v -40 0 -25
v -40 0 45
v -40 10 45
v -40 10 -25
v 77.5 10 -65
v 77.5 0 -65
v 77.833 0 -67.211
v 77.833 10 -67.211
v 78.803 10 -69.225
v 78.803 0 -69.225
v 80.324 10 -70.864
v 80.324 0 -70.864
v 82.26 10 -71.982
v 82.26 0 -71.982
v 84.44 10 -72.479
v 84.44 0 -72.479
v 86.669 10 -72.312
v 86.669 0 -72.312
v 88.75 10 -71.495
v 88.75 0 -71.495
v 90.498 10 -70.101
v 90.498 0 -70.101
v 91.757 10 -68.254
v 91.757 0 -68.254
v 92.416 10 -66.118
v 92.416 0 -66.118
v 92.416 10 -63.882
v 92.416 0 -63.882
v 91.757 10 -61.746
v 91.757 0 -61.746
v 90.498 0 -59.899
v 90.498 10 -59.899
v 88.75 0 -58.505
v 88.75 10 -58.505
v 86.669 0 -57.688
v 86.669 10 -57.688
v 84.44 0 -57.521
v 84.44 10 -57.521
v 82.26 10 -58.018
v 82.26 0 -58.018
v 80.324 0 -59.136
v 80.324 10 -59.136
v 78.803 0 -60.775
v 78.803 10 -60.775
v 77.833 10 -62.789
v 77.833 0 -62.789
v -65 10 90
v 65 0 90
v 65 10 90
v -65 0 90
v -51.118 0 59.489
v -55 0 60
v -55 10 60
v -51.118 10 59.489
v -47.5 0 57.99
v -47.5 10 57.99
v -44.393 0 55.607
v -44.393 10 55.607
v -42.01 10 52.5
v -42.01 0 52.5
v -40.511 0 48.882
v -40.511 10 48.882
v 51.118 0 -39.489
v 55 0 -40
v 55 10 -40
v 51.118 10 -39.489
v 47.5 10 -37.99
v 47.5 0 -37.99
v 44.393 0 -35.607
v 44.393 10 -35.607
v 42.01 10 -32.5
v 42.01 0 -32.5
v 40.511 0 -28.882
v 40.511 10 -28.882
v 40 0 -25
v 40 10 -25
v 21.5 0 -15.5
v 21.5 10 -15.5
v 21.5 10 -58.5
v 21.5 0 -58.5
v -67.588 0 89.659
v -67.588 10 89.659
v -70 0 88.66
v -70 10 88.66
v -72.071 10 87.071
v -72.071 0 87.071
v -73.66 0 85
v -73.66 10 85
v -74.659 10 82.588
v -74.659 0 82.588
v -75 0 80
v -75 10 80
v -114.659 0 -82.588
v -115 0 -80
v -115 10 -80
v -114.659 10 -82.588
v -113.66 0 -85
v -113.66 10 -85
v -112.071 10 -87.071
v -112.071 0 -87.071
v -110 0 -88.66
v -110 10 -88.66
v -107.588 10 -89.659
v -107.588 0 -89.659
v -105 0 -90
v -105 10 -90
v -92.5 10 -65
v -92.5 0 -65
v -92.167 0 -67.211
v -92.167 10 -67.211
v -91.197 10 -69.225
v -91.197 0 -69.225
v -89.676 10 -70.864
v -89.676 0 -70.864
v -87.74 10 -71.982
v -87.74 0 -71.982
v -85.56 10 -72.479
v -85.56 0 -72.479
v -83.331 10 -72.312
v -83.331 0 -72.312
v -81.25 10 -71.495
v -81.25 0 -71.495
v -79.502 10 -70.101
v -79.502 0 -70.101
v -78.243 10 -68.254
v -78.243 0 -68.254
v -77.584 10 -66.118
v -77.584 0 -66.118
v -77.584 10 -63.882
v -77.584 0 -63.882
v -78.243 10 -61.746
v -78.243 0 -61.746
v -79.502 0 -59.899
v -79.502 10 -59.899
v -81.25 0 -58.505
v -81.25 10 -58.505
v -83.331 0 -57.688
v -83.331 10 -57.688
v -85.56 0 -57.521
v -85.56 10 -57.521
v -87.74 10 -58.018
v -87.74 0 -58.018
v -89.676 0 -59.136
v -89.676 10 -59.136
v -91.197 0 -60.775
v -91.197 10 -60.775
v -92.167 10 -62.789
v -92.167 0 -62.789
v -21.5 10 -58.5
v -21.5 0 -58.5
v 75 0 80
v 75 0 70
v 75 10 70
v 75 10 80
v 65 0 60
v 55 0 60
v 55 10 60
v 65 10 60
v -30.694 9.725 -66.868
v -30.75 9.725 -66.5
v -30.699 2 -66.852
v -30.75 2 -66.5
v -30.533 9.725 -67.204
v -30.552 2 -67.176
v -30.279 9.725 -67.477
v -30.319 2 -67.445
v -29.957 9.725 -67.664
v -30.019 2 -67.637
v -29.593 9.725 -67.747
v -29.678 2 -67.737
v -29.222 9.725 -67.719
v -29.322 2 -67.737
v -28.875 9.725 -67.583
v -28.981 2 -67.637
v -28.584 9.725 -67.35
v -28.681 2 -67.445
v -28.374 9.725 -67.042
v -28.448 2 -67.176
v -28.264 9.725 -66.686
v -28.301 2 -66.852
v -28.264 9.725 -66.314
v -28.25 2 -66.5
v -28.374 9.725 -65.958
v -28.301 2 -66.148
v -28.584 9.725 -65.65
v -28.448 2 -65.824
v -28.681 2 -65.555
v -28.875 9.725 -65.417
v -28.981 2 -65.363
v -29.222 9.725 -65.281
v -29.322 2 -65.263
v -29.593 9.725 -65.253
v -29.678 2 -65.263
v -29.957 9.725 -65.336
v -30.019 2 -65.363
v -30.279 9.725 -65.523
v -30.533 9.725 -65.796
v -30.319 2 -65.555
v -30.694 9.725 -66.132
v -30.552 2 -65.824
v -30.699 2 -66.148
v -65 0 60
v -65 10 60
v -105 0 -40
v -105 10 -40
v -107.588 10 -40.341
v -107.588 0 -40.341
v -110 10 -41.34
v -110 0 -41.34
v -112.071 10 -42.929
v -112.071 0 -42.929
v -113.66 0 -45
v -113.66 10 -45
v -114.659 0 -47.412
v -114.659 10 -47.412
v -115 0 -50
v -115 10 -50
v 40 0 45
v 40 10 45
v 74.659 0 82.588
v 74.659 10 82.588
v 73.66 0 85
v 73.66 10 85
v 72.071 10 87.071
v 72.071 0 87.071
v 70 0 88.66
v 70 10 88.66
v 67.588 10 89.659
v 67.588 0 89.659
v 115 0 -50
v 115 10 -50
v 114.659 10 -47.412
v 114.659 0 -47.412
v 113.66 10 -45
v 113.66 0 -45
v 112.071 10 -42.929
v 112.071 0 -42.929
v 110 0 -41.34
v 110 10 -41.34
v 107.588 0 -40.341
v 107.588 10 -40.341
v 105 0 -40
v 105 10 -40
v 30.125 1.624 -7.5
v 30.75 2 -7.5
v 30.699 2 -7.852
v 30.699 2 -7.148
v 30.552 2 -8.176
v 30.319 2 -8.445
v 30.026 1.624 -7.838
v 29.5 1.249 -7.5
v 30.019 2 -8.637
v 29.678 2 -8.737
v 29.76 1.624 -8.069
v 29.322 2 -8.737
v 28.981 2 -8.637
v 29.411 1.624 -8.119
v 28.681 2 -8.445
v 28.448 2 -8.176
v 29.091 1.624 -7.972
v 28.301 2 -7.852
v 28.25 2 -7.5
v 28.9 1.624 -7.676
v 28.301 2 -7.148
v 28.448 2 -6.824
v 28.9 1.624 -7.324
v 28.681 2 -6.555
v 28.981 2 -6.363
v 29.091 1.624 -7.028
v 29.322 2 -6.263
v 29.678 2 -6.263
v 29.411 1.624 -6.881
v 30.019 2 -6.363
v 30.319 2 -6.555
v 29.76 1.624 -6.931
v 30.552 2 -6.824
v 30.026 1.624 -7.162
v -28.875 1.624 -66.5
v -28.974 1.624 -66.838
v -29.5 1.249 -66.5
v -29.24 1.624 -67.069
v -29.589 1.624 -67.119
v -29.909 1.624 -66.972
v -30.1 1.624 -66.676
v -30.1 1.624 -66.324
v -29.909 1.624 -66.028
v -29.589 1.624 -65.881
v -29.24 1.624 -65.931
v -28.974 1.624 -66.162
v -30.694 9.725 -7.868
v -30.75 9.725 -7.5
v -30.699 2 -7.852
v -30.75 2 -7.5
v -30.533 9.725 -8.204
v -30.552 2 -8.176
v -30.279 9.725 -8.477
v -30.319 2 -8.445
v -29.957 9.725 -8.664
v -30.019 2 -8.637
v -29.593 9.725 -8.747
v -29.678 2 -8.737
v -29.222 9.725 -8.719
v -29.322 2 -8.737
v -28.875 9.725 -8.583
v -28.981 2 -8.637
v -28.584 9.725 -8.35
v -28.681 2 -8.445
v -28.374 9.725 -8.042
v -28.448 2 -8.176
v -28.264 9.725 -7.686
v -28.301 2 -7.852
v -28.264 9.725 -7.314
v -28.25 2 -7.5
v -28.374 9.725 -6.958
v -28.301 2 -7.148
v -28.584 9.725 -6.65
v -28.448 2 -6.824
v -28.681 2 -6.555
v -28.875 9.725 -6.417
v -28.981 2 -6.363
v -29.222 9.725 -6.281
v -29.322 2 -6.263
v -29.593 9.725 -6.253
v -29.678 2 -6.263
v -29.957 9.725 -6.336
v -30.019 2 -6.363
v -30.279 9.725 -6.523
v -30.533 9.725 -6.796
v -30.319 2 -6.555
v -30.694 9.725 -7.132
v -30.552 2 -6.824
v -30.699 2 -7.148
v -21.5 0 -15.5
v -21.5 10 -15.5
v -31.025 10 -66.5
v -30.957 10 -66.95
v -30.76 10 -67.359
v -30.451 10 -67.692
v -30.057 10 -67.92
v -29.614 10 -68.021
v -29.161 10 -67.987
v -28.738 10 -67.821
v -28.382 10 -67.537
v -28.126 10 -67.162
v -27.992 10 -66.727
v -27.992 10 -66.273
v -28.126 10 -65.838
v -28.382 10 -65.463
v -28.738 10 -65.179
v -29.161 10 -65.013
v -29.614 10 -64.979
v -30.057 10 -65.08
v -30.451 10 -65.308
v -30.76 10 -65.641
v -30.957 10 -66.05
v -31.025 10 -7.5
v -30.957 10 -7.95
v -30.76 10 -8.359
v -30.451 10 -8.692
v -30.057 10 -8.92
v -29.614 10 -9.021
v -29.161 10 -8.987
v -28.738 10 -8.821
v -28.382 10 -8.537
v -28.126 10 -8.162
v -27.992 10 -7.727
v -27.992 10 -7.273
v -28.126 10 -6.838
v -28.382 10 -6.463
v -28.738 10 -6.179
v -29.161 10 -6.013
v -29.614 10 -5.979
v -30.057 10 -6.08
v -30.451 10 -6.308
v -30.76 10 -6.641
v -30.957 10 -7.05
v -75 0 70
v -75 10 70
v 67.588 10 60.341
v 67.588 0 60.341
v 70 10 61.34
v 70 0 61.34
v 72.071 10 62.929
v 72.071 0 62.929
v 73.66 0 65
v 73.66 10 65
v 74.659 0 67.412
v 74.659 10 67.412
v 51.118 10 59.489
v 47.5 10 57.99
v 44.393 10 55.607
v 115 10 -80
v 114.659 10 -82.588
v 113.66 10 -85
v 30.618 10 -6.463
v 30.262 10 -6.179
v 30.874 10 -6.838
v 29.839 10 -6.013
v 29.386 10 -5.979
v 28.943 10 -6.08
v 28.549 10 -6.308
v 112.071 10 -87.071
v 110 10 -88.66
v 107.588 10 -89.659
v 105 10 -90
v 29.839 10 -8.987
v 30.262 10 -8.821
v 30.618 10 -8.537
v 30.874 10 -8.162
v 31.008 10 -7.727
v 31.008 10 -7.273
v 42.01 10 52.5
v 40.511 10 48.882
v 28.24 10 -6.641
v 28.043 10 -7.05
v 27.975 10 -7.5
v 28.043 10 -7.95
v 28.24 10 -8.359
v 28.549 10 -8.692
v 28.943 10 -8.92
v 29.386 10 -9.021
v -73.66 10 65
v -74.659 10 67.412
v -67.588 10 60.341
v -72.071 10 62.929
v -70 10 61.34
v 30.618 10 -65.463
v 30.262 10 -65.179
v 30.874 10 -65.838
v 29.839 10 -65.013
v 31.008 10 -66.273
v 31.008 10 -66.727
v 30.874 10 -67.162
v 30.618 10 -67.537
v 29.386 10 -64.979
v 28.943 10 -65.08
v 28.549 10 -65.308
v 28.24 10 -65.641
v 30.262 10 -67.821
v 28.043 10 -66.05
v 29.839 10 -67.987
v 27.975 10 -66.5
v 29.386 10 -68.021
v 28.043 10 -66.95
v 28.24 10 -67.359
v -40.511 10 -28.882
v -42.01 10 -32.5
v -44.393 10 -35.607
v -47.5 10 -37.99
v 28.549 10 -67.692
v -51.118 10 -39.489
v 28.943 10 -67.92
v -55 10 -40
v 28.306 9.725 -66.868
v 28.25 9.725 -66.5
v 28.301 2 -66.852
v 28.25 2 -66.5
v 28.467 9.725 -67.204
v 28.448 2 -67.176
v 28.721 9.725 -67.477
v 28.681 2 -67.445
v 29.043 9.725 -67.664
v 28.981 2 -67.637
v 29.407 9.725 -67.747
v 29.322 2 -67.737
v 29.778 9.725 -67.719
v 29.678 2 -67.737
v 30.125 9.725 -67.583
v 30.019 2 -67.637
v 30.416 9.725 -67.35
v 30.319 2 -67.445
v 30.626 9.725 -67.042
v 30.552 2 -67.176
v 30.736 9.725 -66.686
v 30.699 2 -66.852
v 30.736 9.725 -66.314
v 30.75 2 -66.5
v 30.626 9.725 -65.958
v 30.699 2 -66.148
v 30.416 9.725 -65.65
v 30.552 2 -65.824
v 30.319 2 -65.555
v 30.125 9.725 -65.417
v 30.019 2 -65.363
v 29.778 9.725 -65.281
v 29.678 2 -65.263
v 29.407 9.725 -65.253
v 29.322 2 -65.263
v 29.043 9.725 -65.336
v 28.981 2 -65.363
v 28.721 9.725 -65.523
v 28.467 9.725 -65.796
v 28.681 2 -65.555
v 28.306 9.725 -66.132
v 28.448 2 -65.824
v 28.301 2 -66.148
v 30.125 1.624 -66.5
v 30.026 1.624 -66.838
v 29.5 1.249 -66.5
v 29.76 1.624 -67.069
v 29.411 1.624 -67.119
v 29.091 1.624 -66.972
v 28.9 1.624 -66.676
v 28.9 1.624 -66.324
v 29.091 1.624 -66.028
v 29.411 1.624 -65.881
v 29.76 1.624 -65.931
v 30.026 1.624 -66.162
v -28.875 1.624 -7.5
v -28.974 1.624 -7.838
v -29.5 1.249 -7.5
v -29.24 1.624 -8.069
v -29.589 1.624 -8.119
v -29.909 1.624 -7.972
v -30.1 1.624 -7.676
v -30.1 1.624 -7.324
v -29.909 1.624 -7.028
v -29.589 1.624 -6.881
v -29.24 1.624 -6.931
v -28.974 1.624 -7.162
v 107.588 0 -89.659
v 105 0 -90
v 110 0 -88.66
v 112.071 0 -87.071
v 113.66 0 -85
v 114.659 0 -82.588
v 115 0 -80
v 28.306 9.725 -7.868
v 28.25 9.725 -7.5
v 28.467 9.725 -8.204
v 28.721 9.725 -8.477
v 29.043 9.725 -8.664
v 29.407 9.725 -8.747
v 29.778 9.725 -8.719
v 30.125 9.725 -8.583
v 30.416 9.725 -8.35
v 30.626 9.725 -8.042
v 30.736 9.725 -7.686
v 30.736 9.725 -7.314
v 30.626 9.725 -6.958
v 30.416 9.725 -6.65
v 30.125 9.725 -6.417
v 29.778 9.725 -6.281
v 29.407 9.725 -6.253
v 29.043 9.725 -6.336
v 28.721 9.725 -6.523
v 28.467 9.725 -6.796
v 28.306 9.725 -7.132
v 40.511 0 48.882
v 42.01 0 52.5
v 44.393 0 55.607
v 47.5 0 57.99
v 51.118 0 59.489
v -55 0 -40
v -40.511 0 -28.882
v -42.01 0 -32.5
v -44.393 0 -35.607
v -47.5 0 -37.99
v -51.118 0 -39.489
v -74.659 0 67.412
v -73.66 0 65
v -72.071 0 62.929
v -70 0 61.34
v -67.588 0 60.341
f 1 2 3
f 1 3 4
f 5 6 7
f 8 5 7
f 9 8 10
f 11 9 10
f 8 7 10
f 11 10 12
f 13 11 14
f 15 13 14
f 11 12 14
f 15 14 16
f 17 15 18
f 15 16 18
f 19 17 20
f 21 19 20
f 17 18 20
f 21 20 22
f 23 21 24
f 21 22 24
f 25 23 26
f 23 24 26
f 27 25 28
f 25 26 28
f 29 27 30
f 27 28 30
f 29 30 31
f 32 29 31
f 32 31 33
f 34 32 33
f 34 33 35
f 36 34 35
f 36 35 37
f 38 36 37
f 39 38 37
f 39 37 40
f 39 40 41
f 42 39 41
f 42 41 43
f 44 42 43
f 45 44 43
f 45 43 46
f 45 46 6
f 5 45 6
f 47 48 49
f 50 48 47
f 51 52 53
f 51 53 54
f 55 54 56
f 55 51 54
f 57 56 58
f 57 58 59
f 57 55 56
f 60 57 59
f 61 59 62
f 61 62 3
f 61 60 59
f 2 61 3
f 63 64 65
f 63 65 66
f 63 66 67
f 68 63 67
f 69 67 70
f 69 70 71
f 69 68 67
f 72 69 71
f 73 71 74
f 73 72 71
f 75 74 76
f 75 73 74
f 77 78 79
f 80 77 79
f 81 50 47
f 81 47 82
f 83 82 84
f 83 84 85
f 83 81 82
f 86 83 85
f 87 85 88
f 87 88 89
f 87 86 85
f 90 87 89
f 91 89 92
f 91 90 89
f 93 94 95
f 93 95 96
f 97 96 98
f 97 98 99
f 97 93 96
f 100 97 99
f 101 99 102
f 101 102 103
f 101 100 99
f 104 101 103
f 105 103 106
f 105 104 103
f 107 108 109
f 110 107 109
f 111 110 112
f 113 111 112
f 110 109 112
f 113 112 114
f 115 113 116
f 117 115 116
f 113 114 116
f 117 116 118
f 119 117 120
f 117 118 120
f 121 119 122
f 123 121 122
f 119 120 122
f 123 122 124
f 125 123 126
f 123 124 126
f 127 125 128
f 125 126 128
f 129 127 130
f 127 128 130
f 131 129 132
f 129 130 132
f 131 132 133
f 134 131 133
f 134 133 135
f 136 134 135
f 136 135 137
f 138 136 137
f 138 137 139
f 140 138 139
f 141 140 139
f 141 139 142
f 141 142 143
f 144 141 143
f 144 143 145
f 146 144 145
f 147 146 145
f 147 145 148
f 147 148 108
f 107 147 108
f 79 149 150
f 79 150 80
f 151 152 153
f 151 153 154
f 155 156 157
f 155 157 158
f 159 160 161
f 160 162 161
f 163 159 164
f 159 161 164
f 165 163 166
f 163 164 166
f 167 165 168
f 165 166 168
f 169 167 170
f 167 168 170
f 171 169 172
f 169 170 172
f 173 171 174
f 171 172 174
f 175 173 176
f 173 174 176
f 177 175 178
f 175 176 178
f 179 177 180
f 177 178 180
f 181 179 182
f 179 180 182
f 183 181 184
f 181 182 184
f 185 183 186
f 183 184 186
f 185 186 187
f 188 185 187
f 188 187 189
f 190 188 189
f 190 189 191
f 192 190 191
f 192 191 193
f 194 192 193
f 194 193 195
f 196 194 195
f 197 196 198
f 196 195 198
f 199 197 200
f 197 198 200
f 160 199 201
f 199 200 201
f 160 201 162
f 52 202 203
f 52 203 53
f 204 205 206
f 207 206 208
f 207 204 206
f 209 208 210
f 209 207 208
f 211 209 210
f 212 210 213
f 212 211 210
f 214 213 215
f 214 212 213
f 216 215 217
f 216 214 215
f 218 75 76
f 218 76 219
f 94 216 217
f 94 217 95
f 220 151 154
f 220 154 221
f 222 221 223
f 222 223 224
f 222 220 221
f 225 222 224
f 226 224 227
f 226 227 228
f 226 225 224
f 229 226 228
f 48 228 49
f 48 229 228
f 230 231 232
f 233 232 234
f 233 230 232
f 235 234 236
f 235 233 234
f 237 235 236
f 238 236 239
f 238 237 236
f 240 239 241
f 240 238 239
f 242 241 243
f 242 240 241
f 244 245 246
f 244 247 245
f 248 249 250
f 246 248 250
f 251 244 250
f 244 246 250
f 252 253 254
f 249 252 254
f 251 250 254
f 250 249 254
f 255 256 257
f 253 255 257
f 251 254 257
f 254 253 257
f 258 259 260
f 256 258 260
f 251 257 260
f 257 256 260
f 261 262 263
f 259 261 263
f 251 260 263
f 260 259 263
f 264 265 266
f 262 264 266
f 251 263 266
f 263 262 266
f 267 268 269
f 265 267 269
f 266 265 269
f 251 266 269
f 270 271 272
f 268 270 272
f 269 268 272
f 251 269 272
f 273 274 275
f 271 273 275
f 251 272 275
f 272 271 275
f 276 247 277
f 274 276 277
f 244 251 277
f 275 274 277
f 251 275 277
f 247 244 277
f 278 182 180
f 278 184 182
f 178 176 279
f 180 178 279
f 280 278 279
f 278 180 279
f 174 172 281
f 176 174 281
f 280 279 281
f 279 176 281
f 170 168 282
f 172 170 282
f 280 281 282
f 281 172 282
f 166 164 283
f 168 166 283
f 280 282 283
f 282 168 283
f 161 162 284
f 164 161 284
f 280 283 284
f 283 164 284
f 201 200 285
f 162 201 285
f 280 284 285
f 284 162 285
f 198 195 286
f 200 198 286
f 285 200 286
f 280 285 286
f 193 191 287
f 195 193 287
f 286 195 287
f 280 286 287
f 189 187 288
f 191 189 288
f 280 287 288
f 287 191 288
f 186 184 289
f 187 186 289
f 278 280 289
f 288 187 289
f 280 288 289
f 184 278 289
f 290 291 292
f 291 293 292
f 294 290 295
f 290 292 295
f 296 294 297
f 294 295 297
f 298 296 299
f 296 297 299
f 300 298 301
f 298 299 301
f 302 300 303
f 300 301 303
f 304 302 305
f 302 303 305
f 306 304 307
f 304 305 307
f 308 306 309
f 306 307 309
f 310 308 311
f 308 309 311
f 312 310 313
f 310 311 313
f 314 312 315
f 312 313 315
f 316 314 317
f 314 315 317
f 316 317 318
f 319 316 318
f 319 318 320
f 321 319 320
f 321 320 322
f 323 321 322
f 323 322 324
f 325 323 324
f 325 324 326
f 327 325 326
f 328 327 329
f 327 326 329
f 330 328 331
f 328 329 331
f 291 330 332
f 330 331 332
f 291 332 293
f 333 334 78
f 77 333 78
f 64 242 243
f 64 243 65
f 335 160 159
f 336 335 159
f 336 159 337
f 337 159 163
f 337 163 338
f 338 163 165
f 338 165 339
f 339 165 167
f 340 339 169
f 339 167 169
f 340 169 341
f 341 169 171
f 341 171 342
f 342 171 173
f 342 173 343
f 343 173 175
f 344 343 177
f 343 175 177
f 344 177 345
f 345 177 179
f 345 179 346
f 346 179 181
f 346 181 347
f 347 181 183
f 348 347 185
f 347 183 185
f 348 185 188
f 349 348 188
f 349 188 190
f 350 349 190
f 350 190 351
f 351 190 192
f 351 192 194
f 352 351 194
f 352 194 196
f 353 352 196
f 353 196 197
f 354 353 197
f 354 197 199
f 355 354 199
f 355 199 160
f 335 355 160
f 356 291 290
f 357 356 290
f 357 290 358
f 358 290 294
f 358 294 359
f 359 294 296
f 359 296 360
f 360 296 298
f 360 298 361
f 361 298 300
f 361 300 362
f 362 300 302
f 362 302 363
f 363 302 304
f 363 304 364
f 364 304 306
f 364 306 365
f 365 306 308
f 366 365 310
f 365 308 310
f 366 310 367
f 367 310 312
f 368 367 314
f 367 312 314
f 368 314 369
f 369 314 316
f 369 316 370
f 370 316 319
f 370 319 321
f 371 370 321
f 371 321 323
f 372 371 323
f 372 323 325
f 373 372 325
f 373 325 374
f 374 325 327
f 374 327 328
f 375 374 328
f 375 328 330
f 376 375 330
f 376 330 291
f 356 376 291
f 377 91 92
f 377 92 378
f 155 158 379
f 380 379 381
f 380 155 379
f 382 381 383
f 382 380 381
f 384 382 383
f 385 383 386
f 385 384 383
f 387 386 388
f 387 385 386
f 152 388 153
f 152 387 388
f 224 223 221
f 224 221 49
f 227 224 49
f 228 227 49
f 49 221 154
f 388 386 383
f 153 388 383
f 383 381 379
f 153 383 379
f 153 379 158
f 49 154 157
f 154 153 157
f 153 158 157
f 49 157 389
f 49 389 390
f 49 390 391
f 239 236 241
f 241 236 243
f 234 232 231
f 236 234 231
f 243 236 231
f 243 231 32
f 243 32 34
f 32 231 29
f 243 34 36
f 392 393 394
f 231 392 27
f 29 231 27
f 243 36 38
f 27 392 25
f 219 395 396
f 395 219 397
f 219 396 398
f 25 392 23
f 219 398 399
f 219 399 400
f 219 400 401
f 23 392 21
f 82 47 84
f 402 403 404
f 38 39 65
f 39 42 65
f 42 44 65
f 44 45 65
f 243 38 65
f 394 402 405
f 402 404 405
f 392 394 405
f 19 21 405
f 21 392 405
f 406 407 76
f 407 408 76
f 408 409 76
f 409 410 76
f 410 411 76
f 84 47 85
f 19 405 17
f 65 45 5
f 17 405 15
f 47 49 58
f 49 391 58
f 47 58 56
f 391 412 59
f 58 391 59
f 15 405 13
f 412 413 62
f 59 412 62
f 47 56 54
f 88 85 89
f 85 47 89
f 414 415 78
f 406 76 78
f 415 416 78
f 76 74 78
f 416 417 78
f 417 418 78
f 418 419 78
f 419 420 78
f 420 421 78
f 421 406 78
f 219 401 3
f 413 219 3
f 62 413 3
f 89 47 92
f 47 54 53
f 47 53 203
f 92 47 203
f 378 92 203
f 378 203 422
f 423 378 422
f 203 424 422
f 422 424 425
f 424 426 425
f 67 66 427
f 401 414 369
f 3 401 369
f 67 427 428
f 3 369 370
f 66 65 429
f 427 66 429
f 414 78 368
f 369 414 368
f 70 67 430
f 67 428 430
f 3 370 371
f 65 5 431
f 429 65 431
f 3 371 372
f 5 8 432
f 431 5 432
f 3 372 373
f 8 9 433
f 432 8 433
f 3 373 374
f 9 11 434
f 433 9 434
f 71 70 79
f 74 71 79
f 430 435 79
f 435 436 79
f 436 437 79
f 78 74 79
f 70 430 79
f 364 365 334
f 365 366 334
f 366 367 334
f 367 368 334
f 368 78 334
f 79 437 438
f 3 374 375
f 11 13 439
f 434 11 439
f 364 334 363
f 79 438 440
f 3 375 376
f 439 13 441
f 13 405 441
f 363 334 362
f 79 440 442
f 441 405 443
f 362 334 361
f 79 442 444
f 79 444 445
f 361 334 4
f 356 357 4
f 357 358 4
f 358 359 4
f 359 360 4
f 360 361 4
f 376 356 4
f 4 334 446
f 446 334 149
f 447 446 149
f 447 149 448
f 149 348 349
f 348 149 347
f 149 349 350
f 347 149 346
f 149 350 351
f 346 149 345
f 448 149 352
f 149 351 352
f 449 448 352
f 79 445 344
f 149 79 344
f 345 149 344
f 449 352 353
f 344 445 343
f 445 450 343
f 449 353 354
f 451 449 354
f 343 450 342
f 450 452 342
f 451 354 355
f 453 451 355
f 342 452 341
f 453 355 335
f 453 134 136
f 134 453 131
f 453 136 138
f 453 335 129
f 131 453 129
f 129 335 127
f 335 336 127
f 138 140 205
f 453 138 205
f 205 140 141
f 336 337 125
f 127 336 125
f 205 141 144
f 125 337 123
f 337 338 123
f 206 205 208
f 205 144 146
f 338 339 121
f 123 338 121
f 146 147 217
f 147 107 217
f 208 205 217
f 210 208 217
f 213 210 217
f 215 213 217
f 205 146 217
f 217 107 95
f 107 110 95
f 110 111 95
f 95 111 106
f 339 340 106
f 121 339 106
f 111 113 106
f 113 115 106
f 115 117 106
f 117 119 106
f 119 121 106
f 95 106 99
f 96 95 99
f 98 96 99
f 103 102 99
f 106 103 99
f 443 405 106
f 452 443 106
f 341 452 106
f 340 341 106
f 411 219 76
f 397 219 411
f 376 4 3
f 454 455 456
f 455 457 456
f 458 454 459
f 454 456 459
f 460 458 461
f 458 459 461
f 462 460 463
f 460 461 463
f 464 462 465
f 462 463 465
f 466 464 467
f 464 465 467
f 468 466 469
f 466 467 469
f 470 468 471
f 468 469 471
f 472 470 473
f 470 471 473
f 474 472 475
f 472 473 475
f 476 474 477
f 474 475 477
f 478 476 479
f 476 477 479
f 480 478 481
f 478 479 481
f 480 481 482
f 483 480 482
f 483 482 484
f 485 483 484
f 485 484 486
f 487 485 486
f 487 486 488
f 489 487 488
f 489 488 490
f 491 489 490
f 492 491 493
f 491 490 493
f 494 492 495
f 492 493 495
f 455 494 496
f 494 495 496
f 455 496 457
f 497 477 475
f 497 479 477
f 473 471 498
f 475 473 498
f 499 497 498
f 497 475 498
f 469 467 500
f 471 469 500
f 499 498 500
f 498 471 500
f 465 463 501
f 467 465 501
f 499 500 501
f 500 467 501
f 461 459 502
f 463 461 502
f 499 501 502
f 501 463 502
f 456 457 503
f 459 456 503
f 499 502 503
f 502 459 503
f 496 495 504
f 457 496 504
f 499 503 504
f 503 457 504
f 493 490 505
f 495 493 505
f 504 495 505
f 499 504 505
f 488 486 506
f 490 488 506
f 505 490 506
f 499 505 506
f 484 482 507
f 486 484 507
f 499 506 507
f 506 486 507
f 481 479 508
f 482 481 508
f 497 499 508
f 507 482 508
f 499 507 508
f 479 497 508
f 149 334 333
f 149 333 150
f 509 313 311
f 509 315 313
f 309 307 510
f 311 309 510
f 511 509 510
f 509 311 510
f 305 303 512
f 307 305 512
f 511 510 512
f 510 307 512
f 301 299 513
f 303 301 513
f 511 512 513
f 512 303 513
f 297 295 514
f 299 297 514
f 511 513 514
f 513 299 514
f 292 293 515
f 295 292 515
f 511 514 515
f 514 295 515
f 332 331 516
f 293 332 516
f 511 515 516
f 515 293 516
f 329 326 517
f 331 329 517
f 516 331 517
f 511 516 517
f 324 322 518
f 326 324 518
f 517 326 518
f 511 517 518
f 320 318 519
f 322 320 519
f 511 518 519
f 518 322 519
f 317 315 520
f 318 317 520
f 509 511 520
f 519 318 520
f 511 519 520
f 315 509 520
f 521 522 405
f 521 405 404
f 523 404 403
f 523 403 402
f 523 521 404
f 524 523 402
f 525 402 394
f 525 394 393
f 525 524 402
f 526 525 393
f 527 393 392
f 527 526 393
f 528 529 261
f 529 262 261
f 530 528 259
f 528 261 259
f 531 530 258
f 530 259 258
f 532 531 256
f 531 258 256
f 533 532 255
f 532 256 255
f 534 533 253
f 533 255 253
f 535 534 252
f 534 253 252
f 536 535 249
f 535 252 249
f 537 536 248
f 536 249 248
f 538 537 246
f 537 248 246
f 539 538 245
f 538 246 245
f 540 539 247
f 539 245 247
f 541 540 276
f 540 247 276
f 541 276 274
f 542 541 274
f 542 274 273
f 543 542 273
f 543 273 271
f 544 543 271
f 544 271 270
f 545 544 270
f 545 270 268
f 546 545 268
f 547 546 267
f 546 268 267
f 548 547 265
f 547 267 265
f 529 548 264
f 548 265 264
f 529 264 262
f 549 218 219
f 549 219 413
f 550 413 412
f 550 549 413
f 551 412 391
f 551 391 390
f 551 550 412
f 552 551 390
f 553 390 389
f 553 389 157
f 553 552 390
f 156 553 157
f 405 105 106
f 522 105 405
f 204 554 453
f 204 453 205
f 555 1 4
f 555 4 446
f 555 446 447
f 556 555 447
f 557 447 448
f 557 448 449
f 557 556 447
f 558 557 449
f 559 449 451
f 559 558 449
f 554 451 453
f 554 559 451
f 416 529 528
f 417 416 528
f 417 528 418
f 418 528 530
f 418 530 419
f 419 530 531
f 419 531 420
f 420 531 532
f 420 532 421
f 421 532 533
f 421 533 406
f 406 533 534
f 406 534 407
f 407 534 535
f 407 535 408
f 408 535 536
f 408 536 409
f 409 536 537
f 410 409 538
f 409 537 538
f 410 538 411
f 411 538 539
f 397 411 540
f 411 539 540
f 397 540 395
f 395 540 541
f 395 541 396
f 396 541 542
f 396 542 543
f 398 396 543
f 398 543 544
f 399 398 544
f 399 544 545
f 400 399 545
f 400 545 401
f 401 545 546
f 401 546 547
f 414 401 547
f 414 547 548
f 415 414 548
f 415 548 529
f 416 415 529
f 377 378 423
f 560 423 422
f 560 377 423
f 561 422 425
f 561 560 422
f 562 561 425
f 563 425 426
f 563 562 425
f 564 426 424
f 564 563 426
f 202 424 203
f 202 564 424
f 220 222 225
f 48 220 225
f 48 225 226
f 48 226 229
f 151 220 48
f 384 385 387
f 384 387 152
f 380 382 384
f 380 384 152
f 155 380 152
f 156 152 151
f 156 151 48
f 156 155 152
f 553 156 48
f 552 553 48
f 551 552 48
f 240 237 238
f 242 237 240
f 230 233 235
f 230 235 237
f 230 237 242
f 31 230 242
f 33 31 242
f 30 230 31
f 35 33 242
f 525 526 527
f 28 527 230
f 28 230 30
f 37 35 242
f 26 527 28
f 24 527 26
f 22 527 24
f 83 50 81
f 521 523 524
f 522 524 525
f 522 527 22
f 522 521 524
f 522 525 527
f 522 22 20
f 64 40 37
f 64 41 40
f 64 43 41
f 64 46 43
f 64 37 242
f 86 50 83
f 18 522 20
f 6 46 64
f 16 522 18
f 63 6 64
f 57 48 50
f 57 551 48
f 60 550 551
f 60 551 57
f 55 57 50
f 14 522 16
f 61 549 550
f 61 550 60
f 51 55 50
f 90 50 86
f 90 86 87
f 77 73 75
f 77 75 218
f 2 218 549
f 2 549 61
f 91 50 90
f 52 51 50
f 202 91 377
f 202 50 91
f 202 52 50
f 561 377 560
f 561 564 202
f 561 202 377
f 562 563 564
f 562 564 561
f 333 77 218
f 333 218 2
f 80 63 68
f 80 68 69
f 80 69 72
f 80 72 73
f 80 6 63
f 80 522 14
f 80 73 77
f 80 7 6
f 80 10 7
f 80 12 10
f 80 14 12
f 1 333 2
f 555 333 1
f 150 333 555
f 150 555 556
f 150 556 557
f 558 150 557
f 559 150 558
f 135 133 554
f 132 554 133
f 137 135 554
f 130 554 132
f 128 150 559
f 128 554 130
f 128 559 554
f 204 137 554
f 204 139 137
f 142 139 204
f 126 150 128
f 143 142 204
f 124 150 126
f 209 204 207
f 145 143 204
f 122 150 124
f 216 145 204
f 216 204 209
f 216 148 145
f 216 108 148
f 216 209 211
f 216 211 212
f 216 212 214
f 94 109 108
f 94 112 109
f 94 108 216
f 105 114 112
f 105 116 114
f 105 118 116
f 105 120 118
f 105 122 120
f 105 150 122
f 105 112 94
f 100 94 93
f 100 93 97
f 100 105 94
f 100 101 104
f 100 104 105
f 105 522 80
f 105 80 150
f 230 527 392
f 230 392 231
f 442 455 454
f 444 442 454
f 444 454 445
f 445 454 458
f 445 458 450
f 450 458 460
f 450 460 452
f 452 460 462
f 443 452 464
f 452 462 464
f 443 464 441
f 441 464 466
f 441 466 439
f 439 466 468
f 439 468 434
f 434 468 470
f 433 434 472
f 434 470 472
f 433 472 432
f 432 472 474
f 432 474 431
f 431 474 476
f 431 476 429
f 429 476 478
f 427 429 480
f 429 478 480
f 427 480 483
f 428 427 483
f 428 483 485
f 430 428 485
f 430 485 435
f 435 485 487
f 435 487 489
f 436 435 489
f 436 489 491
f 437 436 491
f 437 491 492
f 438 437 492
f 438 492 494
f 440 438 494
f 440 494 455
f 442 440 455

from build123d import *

# Parameters (mm, degrees)
AUFSATZ_LINEAR_AUSTRAGEN1_DEPTH  = 10
F_15_0_15_DURCHMESSER_BOHRUNG1_D = 15
SKIZZE8_W                        = 43
SKIZZE8_H                        = 43
SCHNITT_LINEAR_AUSTRAGEN2_DEPTH  = 10
M3_GEWINDEBOHRUNG1_D             = 2.5
M3_GEWINDEBOHRUNG1_DEPTH         = 8
M3_GEWINDEBOHRUNG1_CSINK_D       = 3.05
M3_GEWINDEBOHRUNG1_CSINK_ANGLE   = 90
M3_GEWINDEBOHRUNG1_TIP           = 0.751075774


with BuildPart() as part:
    # Skizze1 → Aufsatz-Linear austragen1 (new body)
    with BuildSketch(Plane(origin=(0, 0, 0), x_dir=(1, 0, 0), z_dir=(0, 1, 0))):
        with BuildLine():
            Line((-105, 90), (105, 90))
            ThreePointArc((105, 90), (112.071067812, 87.071067812), (115, 80))
            Line((115, 80), (115, 50))
            ThreePointArc((115, 50), (112.071067812, 42.928932188), (105, 40))
            Line((105, 40), (55, 40))
            ThreePointArc((55, 40), (44.393398282, 35.606601718), (40, 25))
            Line((40, 25), (40, -45))
            ThreePointArc((40, -45), (44.393398282, -55.606601718), (55, -60))
            Line((55, -60), (65, -60))
            ThreePointArc((65, -60), (72.071067812, -62.928932188), (75, -70))
            Line((75, -70), (75, -80))
            ThreePointArc((75, -80), (72.071067812, -87.071067812), (65, -90))
            Line((65, -90), (-65, -90))
            ThreePointArc((-65, -90), (-72.071067812, -87.071067812), (-75, -80))
            Line((-75, -80), (-75, -70))
            ThreePointArc((-75, -70), (-72.071067812, -62.928932188), (-65, -60))
            Line((-65, -60), (-55, -60))
            ThreePointArc((-55, -60), (-44.393398282, -55.606601718), (-40, -45))
            Line((-40, -45), (-40, 25))
            ThreePointArc((-40, 25), (-44.393398282, 35.606601718), (-55, 40))
            Line((-55, 40), (-105, 40))
            ThreePointArc((-105, 40), (-112.071067812, 42.928932188), (-115, 50))
            Line((-115, 50), (-115, 80))
            ThreePointArc((-115, 80), (-112.071067812, 87.071067812), (-105, 90))
        make_face()
    extrude(amount=AUFSATZ_LINEAR_AUSTRAGEN1_DEPTH)

    # Ø15.0 (15) Durchmesser Bohrung1 (through all)
    with Locations(Plane(origin=(0, 10, 0), x_dir=(1, 0, 0), z_dir=(0, 1, 0))):
        with Locations((-85, 65), (85, 65)):
            Hole(F_15_0_15_DURCHMESSER_BOHRUNG1_D / 2)

    # Skizze8 → Schnitt-Linear austragen2 (cut)
    with BuildSketch(Plane(origin=(0, 10, 0), x_dir=(1, 0, 0), z_dir=(0, 1, 0))):
        with Locations((0, 37)):
            Rectangle(SKIZZE8_W, SKIZZE8_H)
    extrude(amount=-SCHNITT_LINEAR_AUSTRAGEN2_DEPTH, mode=Mode.SUBTRACT)

    # M3 Gewindebohrung1
    with Locations(Plane(origin=(0, 10, 0), x_dir=(1, 0, 0), z_dir=(0, 1, 0))):
        with Locations((-29.5, 66.5), (-29.5, 7.5), (29.5, 7.5), (29.5, 66.5)):
            CounterSinkHole(M3_GEWINDEBOHRUNG1_D / 2, M3_GEWINDEBOHRUNG1_CSINK_D / 2, depth=M3_GEWINDEBOHRUNG1_DEPTH, counter_sink_angle=M3_GEWINDEBOHRUNG1_CSINK_ANGLE)
            with Locations((0, 0, -(M3_GEWINDEBOHRUNG1_DEPTH + M3_GEWINDEBOHRUNG1_TIP / 2))):  # 118° drill point
                Cone(0, M3_GEWINDEBOHRUNG1_D / 2, M3_GEWINDEBOHRUNG1_TIP, mode=Mode.SUBTRACT)


solid = part.part
